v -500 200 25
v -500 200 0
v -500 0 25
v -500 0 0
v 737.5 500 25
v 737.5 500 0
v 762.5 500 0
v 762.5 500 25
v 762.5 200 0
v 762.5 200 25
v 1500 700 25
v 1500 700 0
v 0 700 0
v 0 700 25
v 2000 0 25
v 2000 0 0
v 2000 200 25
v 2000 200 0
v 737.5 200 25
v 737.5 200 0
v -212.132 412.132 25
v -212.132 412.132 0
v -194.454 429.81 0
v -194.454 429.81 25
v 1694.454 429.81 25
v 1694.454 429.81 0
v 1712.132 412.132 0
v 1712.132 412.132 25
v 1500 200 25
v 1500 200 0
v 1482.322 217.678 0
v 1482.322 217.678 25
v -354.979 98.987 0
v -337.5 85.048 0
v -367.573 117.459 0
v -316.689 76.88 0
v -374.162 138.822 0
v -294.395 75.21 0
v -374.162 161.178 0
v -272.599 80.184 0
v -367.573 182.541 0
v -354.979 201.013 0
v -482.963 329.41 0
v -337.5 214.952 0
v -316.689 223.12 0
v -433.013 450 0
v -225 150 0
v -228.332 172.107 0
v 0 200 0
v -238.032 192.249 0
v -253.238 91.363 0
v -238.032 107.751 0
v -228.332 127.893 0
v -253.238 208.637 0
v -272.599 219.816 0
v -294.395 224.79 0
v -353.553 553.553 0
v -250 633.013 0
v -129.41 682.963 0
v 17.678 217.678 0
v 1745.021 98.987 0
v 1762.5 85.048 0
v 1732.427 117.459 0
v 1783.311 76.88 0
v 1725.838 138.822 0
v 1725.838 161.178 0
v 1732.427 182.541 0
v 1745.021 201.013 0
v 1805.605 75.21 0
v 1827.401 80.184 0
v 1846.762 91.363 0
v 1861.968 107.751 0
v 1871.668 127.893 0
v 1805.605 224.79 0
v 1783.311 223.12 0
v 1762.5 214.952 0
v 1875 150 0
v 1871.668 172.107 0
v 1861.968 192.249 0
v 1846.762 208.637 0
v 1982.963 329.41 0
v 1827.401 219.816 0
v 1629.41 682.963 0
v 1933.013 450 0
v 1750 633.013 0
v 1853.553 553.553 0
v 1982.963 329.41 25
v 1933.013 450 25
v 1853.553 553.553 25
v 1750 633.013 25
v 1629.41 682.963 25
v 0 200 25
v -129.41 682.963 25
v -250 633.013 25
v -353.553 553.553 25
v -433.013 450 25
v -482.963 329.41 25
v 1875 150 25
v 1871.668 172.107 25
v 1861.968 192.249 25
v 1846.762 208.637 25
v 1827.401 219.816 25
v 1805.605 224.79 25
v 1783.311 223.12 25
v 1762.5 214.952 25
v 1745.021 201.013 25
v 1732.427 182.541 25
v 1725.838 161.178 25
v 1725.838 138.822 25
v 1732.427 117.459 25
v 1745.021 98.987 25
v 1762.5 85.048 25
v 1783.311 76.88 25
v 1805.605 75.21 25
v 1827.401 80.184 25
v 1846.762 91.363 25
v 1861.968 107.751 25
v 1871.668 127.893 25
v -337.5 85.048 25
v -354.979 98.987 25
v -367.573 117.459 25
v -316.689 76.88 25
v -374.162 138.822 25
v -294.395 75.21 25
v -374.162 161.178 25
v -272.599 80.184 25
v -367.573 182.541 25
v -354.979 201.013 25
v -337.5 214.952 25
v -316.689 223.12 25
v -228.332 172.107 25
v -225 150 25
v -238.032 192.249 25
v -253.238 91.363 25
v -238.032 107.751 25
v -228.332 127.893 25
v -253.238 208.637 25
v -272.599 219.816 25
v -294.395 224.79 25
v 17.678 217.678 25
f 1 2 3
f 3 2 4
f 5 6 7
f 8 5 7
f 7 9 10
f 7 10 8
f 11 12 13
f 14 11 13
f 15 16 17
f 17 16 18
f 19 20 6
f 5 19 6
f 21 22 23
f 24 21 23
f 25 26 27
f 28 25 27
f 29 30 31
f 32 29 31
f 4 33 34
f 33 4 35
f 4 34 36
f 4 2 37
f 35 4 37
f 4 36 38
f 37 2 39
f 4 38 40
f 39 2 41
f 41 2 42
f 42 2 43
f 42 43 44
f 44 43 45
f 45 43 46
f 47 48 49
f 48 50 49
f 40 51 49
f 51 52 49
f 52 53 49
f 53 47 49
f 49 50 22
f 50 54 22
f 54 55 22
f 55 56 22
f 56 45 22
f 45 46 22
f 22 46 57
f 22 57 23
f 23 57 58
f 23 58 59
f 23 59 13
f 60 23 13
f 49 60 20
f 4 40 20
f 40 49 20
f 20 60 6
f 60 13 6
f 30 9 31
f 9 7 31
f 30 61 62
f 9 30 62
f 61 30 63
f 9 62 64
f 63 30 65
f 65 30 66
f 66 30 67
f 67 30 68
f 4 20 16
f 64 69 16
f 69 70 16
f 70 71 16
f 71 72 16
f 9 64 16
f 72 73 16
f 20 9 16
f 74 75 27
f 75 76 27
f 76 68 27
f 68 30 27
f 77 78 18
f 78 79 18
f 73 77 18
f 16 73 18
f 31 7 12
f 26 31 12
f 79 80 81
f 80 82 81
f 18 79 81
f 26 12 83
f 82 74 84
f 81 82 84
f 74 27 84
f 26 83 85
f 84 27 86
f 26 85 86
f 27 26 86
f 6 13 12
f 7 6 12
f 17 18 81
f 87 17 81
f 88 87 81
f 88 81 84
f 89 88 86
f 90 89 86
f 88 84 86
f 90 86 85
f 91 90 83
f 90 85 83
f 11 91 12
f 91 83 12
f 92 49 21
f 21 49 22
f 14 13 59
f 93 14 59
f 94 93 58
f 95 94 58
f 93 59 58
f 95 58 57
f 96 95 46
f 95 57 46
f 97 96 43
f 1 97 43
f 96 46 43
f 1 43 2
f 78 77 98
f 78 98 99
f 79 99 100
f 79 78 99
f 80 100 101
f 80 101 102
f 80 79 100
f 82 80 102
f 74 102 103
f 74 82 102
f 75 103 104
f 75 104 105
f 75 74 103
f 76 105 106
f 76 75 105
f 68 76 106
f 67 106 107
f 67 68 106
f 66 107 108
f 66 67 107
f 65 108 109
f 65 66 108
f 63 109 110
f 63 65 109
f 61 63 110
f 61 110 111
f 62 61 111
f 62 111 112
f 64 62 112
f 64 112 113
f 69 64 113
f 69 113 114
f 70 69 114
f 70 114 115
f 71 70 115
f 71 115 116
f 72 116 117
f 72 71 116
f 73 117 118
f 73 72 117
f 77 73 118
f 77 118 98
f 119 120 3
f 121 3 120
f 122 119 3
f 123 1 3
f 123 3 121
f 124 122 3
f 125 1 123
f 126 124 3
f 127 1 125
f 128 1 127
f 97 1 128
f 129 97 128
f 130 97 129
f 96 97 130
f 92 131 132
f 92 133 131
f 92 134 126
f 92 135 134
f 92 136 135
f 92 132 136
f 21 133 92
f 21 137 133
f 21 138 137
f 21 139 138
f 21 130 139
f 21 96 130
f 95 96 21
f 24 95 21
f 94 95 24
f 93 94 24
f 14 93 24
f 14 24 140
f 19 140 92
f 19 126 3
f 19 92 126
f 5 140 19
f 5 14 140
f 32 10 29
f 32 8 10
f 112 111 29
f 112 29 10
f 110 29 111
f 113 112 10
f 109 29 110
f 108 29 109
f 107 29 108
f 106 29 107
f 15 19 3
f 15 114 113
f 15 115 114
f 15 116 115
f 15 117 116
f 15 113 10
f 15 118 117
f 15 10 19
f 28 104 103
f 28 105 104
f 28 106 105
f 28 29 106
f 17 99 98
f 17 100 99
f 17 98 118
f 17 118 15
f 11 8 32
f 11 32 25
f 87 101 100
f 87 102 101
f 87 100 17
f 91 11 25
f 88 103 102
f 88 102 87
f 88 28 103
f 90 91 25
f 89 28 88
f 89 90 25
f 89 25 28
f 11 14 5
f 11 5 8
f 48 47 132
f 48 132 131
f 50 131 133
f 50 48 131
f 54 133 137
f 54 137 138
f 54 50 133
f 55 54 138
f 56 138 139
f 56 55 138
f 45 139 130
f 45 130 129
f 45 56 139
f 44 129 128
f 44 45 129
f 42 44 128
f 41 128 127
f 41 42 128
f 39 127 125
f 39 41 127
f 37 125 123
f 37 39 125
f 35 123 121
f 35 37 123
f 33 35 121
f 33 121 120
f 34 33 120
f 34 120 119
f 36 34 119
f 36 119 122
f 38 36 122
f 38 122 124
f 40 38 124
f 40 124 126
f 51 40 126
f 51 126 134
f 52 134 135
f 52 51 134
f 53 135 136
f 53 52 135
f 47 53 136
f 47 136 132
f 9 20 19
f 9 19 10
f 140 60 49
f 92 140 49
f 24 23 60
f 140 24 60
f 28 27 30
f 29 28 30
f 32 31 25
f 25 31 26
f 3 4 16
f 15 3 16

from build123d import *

# Parameters (mm, degrees)
F0_R     = 75
F0_W     = 25
F0_H     = 300
F1_DEPTH = 25


with BuildPart() as f1:
    # F0 (on Top) → F1 (new body)
    with BuildSketch(Plane.XY):
        with BuildLine():
            Line((-500, 200), (-500, 0))
            Line((-500, 0), (2000, 0))
            Line((2000, 0), (2000, 200))
            ThreePointArc((2000, 200), (1853.553391, 553.553391), (1500, 700))
            Line((1500, 700), (0, 700))
            ThreePointArc((0, 700), (-353.553391, 553.553391), (-500, 200))
        make_face()
        with Locations((-300, 150)):
            Circle(F0_R, mode=Mode.SUBTRACT)
        Polygon((17.67767, 217.67767), (0, 200), (-212.132034, 412.132034), (-194.454365, 429.809704), align=None, mode=Mode.SUBTRACT)
        with Locations((1800, 150)):
            Circle(F0_R, mode=Mode.SUBTRACT)
        with Locations((750, 350)):
            Rectangle(F0_W, F0_H, mode=Mode.SUBTRACT)
        Polygon((1712.132034, 412.132034), (1500, 200), (1482.32233, 217.67767), (1694.454365, 429.809704), align=None, mode=Mode.SUBTRACT)
    extrude(amount=F1_DEPTH)


solid = f1.part
